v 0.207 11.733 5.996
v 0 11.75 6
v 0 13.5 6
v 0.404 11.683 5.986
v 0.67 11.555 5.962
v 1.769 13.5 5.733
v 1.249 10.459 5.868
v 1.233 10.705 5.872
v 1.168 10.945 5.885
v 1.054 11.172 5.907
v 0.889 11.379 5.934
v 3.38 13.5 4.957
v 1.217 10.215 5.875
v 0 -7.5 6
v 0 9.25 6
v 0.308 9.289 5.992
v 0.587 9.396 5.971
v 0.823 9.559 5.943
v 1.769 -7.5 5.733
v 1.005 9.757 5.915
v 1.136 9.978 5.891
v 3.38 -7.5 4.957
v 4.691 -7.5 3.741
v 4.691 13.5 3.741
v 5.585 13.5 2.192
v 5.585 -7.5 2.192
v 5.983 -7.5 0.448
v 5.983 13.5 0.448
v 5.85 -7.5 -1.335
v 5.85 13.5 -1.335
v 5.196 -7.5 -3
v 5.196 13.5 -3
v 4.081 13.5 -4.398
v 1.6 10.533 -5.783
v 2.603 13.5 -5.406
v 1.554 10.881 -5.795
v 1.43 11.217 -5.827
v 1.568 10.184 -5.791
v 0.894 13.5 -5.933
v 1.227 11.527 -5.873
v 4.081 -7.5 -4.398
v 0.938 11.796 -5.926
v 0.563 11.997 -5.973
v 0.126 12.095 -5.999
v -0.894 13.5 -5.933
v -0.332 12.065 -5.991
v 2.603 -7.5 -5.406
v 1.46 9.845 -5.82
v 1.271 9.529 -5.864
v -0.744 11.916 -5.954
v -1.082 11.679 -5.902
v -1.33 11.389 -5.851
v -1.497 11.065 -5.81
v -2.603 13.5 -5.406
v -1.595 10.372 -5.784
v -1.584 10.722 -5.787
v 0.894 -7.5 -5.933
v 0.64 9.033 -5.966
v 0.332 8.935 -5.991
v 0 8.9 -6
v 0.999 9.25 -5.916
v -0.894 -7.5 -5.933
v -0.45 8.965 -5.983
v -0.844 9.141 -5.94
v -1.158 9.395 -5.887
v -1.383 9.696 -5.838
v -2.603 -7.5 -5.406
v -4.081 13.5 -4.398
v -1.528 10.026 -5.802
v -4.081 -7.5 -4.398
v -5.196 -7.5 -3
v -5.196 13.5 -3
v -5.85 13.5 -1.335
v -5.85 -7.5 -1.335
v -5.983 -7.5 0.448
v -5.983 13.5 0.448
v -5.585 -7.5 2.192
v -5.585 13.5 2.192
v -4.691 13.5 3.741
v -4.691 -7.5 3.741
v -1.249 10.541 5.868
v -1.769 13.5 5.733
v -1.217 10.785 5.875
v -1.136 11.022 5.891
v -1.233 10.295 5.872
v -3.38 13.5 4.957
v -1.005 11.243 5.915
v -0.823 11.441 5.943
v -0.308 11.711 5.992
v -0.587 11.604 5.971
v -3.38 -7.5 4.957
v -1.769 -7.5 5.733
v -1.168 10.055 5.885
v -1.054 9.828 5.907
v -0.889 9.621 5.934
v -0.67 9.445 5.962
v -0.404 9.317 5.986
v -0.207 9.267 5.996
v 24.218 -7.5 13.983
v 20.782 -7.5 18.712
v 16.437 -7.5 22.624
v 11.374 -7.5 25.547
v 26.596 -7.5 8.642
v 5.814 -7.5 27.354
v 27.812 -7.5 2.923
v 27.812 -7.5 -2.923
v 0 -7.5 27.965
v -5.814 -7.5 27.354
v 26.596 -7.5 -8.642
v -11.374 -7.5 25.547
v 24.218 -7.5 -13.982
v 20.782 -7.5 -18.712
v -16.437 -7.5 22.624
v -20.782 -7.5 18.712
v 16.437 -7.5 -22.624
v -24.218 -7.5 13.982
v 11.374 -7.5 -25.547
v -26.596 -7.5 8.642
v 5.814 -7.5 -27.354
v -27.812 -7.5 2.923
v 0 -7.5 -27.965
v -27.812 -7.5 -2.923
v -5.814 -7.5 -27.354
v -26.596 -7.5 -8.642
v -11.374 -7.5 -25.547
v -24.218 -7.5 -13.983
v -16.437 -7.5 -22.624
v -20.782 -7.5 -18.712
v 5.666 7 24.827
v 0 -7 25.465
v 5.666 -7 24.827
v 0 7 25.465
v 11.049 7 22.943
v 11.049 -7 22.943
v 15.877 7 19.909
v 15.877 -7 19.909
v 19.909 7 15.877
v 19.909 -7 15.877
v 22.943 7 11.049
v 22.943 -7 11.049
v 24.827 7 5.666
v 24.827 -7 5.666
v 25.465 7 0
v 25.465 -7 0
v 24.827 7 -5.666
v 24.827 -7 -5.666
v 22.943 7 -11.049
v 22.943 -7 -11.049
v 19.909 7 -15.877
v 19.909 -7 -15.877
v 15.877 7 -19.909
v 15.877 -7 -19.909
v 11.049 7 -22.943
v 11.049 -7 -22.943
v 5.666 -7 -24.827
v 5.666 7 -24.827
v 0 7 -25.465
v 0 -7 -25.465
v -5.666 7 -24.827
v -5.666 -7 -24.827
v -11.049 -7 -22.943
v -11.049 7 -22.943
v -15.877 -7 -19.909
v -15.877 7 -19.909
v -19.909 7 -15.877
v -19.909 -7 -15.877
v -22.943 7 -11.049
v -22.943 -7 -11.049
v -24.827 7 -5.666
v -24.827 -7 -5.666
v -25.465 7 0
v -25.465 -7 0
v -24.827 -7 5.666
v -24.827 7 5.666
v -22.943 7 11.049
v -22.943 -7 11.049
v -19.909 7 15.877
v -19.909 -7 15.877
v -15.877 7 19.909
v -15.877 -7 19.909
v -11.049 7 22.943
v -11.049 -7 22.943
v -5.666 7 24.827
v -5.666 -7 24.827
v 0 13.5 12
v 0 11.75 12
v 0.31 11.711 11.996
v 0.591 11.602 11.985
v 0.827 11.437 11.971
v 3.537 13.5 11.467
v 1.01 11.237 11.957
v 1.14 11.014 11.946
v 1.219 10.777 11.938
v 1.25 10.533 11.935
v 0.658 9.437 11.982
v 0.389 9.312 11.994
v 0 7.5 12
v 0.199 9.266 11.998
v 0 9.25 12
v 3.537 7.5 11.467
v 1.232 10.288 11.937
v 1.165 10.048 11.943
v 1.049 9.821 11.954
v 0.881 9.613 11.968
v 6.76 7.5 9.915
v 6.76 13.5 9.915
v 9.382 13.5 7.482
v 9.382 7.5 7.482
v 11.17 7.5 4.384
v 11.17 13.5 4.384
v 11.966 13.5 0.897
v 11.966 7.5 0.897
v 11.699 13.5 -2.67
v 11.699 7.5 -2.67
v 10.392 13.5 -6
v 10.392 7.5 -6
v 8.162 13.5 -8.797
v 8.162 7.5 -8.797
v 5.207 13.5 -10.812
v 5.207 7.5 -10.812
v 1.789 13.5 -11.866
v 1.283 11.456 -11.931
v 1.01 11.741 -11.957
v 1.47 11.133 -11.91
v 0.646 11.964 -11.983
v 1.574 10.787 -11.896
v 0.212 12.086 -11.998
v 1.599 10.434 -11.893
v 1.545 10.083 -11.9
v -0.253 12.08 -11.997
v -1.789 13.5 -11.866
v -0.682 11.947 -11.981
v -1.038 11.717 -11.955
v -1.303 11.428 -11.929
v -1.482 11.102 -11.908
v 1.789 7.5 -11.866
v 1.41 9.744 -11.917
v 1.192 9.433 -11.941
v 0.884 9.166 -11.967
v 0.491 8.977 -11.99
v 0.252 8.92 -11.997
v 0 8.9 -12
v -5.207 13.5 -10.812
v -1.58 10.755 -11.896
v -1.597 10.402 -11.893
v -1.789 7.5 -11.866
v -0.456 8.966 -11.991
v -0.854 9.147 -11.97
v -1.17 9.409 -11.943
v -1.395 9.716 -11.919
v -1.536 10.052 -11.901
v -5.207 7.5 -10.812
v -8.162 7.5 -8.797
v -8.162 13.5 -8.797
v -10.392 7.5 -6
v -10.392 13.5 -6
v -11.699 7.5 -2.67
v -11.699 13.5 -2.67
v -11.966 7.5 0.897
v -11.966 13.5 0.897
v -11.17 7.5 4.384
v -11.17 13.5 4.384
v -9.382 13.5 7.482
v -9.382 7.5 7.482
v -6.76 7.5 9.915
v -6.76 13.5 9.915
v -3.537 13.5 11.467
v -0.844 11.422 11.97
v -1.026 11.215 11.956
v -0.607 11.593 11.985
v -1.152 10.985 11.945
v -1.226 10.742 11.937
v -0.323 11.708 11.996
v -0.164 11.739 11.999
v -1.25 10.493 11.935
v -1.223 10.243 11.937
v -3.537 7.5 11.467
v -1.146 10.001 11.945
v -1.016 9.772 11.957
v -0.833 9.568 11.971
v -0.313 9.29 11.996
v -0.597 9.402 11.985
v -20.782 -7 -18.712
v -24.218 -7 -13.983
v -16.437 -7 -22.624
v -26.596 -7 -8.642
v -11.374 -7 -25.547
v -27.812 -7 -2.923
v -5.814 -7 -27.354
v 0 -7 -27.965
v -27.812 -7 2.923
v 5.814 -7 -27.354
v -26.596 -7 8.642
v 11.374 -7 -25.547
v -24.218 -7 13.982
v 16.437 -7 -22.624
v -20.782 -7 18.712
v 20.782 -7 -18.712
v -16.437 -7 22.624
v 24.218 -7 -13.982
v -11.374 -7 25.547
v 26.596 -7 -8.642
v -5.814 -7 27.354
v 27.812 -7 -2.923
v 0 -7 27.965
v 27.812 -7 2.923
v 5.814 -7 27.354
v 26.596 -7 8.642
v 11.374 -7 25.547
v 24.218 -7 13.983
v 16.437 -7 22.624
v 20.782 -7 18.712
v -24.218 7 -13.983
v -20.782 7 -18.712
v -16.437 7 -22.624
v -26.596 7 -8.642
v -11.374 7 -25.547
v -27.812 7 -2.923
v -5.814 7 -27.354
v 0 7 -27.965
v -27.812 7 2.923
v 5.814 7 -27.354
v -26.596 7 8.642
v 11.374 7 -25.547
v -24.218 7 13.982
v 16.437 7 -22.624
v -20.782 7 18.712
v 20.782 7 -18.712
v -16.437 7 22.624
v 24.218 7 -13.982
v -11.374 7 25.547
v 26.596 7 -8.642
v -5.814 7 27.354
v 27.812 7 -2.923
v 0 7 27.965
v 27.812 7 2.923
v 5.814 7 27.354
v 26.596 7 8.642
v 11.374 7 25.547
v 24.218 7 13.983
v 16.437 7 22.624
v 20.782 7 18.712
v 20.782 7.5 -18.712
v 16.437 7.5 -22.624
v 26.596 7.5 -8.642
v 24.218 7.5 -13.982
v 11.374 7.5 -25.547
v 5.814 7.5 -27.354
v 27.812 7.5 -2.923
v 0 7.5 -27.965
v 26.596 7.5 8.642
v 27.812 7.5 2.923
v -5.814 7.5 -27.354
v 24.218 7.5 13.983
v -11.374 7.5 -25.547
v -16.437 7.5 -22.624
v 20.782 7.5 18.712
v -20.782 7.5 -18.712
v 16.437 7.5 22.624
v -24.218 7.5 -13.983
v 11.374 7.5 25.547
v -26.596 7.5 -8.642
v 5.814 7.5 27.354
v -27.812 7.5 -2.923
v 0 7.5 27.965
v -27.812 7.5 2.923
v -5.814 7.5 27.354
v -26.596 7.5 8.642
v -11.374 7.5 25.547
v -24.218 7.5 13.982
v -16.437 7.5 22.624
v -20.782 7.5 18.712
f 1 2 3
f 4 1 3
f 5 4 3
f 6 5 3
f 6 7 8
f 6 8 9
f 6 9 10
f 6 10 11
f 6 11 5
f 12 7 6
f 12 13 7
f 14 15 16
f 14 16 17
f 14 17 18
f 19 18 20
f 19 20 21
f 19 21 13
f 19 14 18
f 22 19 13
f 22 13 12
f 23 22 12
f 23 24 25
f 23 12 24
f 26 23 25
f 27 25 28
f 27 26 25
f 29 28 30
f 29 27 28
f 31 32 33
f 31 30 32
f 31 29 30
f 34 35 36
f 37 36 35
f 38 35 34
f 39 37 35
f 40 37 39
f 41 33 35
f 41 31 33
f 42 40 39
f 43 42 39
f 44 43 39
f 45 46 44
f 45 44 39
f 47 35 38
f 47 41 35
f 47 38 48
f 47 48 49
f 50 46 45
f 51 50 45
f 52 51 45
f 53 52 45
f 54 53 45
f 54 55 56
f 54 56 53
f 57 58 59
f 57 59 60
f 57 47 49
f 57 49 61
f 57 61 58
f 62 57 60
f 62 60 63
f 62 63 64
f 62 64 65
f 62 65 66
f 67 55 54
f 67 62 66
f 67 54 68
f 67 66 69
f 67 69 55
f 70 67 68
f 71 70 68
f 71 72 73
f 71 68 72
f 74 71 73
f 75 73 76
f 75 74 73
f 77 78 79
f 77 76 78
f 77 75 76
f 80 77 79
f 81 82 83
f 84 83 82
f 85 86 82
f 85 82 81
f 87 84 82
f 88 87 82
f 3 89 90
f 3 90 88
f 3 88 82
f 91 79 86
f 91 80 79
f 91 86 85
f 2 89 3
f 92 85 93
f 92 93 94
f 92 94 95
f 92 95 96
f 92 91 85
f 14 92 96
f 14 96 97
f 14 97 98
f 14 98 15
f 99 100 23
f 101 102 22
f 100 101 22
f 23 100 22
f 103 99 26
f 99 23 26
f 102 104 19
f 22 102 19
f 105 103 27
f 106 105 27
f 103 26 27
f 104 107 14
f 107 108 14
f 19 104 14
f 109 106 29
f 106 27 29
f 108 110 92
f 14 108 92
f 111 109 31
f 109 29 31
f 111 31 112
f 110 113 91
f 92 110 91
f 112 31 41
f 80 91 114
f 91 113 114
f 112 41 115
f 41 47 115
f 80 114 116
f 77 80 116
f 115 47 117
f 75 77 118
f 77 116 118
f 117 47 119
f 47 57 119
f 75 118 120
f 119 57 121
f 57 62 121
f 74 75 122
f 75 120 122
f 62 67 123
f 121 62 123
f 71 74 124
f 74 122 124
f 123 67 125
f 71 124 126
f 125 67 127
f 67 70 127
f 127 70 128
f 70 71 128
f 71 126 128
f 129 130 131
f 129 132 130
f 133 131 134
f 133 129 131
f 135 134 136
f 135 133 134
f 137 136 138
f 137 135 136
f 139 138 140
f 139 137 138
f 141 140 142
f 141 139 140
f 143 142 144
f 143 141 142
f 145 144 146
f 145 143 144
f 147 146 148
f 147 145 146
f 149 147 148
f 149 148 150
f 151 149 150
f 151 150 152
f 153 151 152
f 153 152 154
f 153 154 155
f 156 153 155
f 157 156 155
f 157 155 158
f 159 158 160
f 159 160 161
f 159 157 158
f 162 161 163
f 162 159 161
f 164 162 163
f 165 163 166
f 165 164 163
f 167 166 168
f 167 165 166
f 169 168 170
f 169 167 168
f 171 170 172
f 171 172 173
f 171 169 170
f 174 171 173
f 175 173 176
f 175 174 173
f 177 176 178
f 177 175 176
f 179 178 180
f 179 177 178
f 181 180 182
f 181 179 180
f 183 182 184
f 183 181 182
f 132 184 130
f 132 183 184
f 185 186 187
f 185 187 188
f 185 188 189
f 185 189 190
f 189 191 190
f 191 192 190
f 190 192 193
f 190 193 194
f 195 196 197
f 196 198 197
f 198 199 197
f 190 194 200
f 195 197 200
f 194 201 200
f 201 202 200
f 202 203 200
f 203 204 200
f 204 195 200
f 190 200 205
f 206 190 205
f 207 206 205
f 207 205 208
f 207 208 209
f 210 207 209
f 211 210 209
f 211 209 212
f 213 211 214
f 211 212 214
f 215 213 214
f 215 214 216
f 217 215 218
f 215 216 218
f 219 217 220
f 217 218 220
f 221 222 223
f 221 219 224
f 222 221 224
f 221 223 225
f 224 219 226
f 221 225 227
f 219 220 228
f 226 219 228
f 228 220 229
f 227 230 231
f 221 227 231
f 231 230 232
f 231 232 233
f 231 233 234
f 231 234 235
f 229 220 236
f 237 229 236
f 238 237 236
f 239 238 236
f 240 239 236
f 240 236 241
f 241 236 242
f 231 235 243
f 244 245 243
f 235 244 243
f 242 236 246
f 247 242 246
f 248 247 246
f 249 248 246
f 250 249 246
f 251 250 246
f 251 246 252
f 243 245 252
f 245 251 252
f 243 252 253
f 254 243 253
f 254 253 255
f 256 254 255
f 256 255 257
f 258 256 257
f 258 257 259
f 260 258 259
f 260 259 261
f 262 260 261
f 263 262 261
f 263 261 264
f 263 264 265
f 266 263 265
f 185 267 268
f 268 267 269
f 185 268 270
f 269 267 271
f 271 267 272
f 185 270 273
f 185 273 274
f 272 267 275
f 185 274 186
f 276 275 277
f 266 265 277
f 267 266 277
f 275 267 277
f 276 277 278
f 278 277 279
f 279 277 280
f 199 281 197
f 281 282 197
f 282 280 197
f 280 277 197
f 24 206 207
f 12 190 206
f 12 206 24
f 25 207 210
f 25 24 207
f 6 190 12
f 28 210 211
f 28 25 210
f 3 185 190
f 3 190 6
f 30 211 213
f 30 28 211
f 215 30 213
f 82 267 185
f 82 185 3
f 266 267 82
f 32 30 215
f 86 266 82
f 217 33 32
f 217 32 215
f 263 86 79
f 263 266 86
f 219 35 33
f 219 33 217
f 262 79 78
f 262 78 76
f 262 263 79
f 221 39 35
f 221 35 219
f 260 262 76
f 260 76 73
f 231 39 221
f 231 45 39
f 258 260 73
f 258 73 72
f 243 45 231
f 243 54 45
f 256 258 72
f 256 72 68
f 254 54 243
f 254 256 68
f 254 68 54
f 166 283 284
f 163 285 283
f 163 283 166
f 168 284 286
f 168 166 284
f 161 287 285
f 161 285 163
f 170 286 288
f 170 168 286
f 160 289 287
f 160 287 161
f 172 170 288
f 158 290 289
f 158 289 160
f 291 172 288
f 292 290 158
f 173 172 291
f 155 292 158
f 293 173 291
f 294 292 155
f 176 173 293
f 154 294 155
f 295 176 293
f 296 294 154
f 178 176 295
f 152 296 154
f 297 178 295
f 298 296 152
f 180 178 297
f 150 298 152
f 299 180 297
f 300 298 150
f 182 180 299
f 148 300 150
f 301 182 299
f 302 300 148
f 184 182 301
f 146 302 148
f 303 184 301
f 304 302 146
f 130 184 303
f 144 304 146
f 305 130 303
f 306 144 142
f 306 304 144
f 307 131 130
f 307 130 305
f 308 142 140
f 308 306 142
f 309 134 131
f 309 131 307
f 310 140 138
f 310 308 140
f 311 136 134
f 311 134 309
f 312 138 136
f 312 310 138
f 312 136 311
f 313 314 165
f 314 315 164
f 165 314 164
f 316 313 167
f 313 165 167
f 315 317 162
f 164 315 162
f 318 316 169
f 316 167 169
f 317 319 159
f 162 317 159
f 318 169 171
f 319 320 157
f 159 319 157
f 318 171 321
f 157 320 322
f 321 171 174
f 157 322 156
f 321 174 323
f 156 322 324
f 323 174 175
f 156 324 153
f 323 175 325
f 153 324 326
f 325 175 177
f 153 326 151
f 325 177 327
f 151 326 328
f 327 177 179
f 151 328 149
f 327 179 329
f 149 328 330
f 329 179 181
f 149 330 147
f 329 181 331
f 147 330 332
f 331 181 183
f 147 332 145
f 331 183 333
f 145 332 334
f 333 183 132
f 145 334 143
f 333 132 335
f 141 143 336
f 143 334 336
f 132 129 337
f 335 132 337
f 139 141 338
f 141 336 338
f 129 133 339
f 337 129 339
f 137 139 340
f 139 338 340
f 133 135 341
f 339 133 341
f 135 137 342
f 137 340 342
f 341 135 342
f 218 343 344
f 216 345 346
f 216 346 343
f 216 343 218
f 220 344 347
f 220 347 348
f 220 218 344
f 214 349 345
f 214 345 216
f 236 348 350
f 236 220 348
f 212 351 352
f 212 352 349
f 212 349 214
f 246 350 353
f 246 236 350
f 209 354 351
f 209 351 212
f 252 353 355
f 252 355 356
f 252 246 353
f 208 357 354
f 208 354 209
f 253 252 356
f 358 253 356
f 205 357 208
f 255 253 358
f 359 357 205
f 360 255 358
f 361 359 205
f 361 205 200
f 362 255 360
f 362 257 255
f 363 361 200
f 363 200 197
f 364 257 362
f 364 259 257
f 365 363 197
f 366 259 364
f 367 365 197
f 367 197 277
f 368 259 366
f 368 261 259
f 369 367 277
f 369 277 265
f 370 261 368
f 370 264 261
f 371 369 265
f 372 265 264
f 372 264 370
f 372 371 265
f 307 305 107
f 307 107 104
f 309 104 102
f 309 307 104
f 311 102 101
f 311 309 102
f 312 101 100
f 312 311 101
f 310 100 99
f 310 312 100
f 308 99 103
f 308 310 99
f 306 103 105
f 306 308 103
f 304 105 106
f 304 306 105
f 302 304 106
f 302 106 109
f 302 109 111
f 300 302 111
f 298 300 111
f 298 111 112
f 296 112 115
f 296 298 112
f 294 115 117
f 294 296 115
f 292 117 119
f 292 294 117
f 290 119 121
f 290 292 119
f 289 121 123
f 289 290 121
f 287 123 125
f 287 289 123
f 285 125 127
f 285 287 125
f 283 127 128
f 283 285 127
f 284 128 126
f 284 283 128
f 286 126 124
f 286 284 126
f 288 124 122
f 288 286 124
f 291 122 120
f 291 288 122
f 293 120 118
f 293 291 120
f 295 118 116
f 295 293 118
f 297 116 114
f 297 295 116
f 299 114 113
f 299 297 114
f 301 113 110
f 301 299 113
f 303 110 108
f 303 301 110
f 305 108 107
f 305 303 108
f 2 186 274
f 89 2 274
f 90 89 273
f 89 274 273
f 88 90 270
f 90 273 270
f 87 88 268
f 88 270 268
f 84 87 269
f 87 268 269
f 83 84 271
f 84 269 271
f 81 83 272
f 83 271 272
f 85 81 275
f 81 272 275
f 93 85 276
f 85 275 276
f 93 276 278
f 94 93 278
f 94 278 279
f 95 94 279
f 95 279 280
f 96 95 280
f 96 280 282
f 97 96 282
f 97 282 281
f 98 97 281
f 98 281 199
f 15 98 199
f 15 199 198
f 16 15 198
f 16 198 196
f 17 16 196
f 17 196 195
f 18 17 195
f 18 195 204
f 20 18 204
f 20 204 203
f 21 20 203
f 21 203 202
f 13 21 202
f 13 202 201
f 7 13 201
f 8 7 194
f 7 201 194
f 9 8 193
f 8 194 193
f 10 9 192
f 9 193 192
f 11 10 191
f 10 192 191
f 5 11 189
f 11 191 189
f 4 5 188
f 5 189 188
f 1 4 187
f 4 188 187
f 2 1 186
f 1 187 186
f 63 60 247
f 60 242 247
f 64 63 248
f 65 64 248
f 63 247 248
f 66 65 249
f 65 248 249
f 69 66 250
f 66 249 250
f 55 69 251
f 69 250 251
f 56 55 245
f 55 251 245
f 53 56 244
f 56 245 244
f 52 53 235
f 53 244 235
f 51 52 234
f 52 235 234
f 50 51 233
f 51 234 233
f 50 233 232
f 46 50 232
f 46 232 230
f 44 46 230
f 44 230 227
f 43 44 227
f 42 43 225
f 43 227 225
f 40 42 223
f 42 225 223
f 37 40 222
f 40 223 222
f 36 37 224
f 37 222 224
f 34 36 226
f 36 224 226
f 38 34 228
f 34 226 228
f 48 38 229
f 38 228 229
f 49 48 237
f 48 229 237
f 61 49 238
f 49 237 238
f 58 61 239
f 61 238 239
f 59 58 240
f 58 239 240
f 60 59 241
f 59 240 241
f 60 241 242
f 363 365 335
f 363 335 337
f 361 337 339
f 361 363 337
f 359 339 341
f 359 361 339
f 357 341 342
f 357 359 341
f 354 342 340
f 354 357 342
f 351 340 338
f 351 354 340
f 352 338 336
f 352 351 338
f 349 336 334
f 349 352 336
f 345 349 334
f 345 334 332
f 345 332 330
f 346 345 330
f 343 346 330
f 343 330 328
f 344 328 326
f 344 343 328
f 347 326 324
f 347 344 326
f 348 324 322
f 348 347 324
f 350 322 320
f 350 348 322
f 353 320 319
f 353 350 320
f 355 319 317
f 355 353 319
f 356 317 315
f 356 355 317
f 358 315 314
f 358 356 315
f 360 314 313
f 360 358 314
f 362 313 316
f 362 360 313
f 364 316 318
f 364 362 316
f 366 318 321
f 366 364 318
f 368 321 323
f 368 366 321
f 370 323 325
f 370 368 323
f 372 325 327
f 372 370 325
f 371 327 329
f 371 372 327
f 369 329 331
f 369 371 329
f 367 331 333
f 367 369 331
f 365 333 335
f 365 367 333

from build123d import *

# Parameters (mm, degrees)
CROQUIS1_R                 = 25.465
SALIENTE_EXTRUIR1_DEPTH    = 7.5
CROQUIS2_R                 = 27.965
SALIENTE_EXTRUIR2_DEPTH    = 0.5
SALIENTE_EXTRUIR3_START    = -14.5
CROQUIS2_2_R               = 27.965
SALIENTE_EXTRUIR3_DEPTH    = 0.5
CROQUIS3_R                 = 19
SALIENTE_EXTRUIR4_DEPTH    = 21
CORTAR_EXTRUIR1_DEPTH      = 45.545846608
CORTAR_EXTRUIR1_DEPTH_BACK = 45.545846608
CROQUIS4_R                 = 6
CORTAR_EXTRUIR2_START      = -6
CROQUIS5_R                 = 19
CROQUIS5_R_2               = 12
CORTAR_EXTRUIR2_DEPTH      = 6
TALADRO_ROSCADO_M31_REACH  = 60.109
TALADRO_ROSCADO_M31_BORE_R = 1.25
CROQUIS10_W                = 1.6
CROQUIS10_H                = 12


with BuildPart() as part:
    # Croquis1 → Saliente-Extruir1 (new, symmetric)
    with BuildSketch(Plane(origin=(0, 0, 0), x_dir=(-1, 0, 0), z_dir=(0, 1, 0))):
        with Locations(Location((0, 0, 0), (0, 0, 90))):
            Circle(CROQUIS1_R)
    extrude(amount=SALIENTE_EXTRUIR1_DEPTH, both=True)

    # Croquis2 → Saliente-Extruir2 (add)
    with BuildSketch(Plane(origin=(0, 7.5, 0), x_dir=(-1, 0, 0), z_dir=(0, 1, 0))):
        with Locations(Location((0, 0, 0), (0, 0, 90))):
            Circle(CROQUIS2_R)
    extrude(amount=-SALIENTE_EXTRUIR2_DEPTH)

    # Croquis2<2> → Saliente-Extruir3 (add)
    with BuildSketch(Plane(origin=(0, 7.5, 0), x_dir=(-1, 0, 0), z_dir=(0, 1, 0)).offset(SALIENTE_EXTRUIR3_START)):
        with Locations(Location((0, 0, 0), (0, 0, 90))):
            Circle(CROQUIS2_2_R)
    extrude(amount=-SALIENTE_EXTRUIR3_DEPTH)

    # Croquis3 → Saliente-Extruir4 (add)
    with BuildSketch(Plane(origin=(0, -7.5, 0), x_dir=(-1, 0, 0), z_dir=(0, 1, 0))):
        with Locations(Location((0, 0, 0), (0, 0, 270))):
            Circle(CROQUIS3_R)
    extrude(amount=SALIENTE_EXTRUIR4_DEPTH)

    # Croquis4 → Cortar-Extruir1 (cut, two sides: drawn at the far end of the back side and taken through both)
    with BuildSketch(Plane(origin=(0, -7, 0), x_dir=(-1, 0, 0), z_dir=(0, 1, 0)).offset(-CORTAR_EXTRUIR1_DEPTH_BACK)):
        with Locations(Location((0, 0, 0), (0, 0, 90))):
            Circle(CROQUIS4_R)
    extrude(amount=CORTAR_EXTRUIR1_DEPTH + CORTAR_EXTRUIR1_DEPTH_BACK, mode=Mode.SUBTRACT)

    # Croquis5 → Cortar-Extruir2 (cut)
    with BuildSketch(Plane(origin=(0, 13.5, 0), x_dir=(-1, 0, 0), z_dir=(0, 1, 0)).offset(CORTAR_EXTRUIR2_START)):
        Circle(CROQUIS5_R)
        with Locations(Location((0, 0, 0), (0, 0, 90))):
            Circle(CROQUIS5_R_2, mode=Mode.SUBTRACT)
    extrude(amount=CORTAR_EXTRUIR2_DEPTH, mode=Mode.SUBTRACT)

    # Taladro roscado M31 bore → Taladro roscado M31 (cut, up to next)
    with BuildSketch(Plane(origin=(-12, 0, 12), x_dir=(0, 1, 0), z_dir=(0, 0, 1)), mode=Mode.PRIVATE) as taladro_roscado_m31_sk1:
        with Locations((10.5, -12)):
            Circle(TALADRO_ROSCADO_M31_BORE_R)
    taladro_roscado_m31_tool1 = extrude(taladro_roscado_m31_sk1.sketch, amount=-TALADRO_ROSCADO_M31_REACH, mode=Mode.PRIVATE) & part.part
    add(taladro_roscado_m31_tool1.solids().sort_by_distance((0, 10.5, 12))[0], mode=Mode.SUBTRACT)

    # Croquis10 → Taladro de margen para M32 (revolve, cut)
    with BuildSketch(Plane(origin=(0, 10.5, 0), x_dir=(0, -1, 0), z_dir=(1, 0, 0))):
        with Locations((0.8, 6)):
            Rectangle(CROQUIS10_W, CROQUIS10_H)
    revolve(axis=Axis((0, 10.5, 6.35), (0, 0, -1)), mode=Mode.SUBTRACT)


solid = part.part
